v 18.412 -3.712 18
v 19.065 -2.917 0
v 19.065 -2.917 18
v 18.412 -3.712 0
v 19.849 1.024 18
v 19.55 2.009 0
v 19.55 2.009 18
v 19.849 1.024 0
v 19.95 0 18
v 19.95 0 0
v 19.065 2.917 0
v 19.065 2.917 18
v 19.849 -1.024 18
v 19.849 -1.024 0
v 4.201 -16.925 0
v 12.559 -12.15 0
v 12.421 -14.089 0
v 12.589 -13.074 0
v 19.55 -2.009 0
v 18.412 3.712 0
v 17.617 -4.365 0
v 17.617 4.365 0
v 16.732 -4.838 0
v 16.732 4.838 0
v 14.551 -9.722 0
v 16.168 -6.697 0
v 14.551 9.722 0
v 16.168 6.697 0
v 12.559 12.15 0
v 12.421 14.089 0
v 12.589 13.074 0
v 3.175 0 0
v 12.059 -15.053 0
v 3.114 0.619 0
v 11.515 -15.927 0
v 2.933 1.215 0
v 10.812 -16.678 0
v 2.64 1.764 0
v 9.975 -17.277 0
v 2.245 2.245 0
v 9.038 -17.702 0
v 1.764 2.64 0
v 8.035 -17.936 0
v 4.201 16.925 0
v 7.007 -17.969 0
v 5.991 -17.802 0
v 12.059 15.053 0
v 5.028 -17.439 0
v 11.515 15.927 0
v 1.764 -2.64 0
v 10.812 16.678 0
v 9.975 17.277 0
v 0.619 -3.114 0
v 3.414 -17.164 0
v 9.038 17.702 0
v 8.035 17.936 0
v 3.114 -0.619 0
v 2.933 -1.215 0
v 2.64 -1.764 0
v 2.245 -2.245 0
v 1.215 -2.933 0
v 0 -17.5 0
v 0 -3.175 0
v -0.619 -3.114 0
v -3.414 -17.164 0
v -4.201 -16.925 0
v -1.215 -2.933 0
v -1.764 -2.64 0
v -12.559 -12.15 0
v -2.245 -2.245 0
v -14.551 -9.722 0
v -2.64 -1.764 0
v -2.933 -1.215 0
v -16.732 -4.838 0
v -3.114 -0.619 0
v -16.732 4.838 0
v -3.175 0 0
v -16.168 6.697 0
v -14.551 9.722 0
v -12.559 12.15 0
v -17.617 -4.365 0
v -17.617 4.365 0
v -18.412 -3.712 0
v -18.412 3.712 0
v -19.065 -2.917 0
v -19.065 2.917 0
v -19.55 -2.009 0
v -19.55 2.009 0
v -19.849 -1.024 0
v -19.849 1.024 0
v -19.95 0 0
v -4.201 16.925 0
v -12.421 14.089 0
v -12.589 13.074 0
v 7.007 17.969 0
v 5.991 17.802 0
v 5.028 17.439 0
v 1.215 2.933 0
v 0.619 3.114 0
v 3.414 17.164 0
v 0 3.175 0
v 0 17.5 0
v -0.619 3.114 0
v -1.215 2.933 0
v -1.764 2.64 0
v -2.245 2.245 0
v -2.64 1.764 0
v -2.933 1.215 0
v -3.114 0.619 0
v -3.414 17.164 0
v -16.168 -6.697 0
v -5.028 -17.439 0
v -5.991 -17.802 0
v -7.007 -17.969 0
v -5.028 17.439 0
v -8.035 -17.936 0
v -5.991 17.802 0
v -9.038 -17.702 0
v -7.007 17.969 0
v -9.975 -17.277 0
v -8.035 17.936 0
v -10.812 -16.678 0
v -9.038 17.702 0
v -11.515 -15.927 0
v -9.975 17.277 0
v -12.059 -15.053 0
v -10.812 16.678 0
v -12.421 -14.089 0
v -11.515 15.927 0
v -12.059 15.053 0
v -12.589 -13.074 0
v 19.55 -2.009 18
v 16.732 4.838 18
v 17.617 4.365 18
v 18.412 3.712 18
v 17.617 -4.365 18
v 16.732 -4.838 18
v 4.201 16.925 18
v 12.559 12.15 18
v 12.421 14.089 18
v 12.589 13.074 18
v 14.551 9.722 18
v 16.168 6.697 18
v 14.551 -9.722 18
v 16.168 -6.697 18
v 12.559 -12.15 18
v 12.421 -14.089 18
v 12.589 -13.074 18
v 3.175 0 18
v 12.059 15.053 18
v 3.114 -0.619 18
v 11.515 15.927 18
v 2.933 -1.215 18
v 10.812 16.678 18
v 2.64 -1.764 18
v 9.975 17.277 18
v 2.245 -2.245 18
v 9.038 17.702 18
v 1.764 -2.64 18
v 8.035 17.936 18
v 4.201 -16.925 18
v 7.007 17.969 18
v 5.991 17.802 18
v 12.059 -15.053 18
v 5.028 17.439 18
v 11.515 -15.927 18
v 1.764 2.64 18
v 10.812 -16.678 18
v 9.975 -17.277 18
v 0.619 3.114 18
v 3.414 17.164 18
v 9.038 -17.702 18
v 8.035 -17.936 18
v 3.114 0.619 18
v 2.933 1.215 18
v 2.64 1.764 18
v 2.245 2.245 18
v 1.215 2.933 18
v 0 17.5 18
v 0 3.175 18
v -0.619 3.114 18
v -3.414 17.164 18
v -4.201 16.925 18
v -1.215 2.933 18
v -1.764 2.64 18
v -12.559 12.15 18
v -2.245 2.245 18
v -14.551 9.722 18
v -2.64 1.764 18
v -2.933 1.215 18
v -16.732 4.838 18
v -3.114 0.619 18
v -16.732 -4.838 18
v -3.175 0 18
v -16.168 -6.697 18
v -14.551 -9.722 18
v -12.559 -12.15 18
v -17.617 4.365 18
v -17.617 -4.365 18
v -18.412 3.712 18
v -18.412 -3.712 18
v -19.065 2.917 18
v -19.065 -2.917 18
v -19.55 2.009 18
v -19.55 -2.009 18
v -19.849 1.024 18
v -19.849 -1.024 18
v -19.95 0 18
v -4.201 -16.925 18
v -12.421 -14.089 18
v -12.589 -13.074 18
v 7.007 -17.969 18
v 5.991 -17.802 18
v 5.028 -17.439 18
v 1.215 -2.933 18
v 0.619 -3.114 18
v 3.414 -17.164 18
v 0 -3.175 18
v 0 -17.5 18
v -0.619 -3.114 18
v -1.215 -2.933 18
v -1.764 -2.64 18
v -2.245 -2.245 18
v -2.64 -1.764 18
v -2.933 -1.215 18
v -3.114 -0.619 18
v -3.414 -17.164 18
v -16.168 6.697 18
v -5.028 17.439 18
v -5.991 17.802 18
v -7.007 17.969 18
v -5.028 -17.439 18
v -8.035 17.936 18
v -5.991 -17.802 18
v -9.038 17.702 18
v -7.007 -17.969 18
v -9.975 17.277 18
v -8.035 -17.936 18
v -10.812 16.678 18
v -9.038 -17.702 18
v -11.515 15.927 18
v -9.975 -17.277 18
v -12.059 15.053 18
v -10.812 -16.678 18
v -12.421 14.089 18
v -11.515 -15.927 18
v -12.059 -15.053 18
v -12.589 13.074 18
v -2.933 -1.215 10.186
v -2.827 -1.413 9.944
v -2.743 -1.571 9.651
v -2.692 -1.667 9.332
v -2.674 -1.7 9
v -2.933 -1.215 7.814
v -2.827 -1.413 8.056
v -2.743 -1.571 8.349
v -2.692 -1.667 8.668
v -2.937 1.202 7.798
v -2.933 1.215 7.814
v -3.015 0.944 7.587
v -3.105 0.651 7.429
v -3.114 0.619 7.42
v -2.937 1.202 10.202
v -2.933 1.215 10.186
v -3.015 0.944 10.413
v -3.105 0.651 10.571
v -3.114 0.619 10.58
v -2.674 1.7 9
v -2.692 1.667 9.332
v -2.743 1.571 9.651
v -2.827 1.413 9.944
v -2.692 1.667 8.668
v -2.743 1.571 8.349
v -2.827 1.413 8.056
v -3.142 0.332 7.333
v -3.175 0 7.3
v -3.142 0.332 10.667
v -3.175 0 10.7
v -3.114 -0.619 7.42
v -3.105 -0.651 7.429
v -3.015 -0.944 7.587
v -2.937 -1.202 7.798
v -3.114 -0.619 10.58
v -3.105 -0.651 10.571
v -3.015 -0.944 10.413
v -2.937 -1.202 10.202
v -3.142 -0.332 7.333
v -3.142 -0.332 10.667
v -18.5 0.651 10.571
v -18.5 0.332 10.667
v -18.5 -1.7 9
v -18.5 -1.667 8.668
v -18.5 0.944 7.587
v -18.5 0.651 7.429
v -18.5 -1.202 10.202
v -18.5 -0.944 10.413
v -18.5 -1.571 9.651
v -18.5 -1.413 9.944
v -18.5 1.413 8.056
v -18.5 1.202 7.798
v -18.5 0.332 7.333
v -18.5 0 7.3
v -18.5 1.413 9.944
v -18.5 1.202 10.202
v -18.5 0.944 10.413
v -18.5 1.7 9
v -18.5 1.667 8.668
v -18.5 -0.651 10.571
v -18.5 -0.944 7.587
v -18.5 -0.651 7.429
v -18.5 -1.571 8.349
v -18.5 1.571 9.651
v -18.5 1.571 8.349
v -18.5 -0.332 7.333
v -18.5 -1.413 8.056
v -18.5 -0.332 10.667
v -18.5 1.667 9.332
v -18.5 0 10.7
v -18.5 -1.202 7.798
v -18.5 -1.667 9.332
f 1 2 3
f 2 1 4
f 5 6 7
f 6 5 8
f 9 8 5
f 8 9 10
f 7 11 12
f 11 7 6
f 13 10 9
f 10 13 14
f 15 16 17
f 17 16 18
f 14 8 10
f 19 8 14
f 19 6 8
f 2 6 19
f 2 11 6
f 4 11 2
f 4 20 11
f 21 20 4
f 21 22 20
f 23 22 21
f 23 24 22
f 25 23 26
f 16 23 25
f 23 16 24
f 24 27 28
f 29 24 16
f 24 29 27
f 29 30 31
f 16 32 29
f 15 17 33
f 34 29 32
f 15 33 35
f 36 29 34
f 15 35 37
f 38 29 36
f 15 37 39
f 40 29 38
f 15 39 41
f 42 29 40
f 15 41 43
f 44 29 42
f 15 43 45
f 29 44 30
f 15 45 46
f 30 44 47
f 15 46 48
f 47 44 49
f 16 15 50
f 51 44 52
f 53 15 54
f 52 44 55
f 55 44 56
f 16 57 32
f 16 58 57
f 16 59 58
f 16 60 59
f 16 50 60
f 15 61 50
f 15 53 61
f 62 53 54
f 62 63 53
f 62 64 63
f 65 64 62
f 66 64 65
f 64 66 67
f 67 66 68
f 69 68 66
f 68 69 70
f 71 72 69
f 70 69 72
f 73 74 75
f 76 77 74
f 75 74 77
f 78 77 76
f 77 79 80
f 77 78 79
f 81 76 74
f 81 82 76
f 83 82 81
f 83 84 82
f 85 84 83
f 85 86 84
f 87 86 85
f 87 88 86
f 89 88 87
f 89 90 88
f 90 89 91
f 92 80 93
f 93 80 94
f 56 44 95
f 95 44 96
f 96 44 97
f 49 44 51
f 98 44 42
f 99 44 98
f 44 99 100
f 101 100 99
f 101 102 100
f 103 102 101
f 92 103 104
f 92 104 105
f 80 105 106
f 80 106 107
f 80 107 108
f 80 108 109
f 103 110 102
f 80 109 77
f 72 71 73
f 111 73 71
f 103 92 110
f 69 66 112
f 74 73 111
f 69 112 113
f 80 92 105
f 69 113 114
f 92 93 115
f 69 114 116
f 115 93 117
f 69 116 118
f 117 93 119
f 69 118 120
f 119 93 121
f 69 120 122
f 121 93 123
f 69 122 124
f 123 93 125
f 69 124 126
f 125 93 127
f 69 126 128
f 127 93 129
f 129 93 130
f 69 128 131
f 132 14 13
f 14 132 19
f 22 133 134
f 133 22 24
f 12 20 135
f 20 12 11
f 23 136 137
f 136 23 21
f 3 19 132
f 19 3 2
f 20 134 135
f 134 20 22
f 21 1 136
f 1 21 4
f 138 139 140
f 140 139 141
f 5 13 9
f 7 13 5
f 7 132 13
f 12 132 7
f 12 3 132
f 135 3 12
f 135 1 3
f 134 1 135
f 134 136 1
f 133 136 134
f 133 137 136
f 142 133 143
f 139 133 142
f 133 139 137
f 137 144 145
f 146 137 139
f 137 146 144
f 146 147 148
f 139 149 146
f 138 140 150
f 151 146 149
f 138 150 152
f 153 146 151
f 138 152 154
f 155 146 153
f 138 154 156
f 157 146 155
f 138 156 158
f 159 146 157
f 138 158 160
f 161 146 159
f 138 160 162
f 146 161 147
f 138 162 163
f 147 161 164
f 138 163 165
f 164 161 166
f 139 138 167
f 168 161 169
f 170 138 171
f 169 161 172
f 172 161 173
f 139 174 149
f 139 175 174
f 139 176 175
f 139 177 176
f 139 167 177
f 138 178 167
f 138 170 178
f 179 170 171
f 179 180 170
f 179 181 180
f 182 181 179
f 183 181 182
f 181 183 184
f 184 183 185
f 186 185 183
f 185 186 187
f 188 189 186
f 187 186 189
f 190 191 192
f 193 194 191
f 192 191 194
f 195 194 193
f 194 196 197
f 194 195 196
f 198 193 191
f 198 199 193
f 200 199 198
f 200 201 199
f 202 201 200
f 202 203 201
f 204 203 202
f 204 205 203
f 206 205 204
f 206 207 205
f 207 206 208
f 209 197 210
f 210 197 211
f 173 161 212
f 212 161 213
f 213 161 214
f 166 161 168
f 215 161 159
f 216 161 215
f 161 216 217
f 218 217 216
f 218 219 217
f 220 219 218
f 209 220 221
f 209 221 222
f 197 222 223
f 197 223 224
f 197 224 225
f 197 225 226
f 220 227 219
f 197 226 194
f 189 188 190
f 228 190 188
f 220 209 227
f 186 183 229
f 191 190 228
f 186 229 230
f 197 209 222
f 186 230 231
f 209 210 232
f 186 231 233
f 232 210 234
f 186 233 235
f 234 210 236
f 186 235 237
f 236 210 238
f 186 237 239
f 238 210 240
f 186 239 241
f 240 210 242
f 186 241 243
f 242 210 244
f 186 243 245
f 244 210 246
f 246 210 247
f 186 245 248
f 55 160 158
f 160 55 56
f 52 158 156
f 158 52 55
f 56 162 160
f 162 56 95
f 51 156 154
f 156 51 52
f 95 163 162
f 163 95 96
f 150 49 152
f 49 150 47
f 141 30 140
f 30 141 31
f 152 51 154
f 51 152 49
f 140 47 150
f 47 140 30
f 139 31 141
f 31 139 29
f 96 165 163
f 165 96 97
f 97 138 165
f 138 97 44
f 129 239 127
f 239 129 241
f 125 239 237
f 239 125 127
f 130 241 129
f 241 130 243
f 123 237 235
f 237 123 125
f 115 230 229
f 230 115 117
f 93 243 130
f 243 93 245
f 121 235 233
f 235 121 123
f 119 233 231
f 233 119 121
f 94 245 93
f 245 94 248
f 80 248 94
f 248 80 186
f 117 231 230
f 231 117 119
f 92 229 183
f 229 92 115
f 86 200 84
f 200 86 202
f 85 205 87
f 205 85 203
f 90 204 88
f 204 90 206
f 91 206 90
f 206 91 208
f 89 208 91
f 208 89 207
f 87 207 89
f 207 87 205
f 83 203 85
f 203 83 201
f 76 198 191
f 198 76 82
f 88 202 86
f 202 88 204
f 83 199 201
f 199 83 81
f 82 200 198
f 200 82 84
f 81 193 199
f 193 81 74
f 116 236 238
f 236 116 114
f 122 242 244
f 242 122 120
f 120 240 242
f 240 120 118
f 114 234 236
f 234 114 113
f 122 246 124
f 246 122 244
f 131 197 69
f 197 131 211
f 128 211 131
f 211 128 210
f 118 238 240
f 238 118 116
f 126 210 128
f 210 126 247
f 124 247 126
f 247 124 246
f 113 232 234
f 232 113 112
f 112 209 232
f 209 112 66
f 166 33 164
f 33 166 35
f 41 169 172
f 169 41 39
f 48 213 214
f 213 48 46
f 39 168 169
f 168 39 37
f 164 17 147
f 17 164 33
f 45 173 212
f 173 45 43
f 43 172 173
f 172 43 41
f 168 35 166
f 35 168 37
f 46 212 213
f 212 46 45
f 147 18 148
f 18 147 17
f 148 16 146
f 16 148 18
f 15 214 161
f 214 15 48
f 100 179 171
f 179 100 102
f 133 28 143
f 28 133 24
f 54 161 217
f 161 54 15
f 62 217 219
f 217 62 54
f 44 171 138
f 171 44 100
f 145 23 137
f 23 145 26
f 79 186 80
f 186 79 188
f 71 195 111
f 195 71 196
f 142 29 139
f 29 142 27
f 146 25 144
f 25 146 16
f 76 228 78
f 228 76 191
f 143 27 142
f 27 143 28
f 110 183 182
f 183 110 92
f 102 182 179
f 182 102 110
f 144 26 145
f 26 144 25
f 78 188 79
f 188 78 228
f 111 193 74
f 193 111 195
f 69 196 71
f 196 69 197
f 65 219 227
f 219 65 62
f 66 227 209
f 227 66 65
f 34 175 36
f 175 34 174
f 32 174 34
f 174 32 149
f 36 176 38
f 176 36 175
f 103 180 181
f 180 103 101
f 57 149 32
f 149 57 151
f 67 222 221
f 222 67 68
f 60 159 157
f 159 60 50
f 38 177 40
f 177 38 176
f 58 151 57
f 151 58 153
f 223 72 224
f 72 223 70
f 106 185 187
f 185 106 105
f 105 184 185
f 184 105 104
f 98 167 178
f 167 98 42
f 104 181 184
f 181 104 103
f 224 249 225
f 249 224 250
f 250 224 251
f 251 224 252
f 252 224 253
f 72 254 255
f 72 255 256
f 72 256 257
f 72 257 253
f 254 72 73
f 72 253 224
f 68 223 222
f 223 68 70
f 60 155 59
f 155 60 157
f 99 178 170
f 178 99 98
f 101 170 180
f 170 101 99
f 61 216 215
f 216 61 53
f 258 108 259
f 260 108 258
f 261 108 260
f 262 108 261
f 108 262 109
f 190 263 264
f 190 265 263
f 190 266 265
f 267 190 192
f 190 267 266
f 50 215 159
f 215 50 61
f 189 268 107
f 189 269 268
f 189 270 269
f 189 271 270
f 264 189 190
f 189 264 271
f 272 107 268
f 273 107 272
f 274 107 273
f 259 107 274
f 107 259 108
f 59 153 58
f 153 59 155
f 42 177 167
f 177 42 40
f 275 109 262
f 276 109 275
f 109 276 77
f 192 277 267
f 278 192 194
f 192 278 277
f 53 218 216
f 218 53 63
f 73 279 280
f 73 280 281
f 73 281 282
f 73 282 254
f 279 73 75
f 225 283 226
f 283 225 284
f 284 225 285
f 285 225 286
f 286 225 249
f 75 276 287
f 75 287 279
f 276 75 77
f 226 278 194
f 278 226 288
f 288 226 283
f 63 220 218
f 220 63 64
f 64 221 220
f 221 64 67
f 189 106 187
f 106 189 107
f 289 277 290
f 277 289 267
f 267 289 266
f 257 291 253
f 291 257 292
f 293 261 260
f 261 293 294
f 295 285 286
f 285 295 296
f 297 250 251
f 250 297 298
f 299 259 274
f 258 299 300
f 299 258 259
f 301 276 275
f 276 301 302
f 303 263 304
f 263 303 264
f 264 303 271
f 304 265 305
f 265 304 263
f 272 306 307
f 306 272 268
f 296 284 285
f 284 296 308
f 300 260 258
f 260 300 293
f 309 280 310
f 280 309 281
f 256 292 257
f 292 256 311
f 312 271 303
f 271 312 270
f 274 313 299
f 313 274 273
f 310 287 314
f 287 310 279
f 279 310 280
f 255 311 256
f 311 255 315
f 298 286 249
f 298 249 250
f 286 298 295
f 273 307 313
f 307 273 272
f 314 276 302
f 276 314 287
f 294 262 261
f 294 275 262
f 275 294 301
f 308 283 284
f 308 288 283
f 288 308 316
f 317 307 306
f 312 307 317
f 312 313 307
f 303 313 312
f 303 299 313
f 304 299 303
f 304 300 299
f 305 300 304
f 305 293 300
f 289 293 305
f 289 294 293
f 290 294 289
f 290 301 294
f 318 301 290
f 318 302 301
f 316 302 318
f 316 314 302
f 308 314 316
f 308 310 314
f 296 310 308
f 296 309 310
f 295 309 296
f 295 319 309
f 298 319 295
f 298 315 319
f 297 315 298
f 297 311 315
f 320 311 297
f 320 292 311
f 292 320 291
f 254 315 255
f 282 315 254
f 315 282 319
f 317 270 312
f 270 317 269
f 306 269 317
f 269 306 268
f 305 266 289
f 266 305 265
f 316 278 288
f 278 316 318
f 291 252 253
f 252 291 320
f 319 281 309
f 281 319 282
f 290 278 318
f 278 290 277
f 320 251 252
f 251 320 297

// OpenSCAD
$fn = 32;

// ----------------------------------------------------------------------
// Hand knob: 35 x 35 x 18 mm
// ----------------------------------------------------------------------

// --- parameters (mm) ---
knob_d = 35;              // knob diameter
knob_h = 18;              // knob height
bore_d = 6.35;            // shaft bore
set_d = 3.4;              // set screw tap hole
knurl_d = 1.01;           // knurl groove diameter
lobes = 6;                // grip lobes

module body() {
  cylinder(h = knob_h, d = knob_d);
  for (i = [0 : lobes - 1])
    rotate([0, 0, i * 360 / lobes])
      translate([knob_d * 0.42, 0, 0])
        cylinder(h = knob_h, d = knob_d * 0.3);
}

difference() {
  union() {
    body();
  }
  translate([0, 0, -1]) cylinder(h = knob_h + 0 + 2, d = bore_d);
  translate([-knob_d / 2 - 1, 0, knob_h * 0.5]) rotate([0, 90, 0]) cylinder(h = knob_d / 2 + 2, d = set_d);
}
